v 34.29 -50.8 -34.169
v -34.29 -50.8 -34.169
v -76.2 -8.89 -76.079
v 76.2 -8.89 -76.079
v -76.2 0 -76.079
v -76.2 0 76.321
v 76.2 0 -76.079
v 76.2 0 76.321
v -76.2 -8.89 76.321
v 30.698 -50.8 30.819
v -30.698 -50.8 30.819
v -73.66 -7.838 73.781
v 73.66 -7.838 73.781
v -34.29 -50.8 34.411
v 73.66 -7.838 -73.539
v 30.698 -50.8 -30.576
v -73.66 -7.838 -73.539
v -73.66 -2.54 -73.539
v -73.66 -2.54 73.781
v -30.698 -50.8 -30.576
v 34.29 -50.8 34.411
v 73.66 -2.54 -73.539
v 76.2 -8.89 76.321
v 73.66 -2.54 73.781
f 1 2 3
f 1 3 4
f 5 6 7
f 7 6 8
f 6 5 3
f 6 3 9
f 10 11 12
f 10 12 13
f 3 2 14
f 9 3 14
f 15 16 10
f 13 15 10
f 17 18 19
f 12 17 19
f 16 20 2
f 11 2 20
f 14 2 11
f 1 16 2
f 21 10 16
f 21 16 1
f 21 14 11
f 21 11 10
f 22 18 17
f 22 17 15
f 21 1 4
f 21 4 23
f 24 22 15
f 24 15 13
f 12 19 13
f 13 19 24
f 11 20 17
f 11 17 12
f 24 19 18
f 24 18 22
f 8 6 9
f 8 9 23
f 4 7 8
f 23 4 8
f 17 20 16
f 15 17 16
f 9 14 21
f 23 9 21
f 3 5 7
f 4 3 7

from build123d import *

# Parameters (mm, degrees)
F0_W     = 152.4
F0_H     = 152.4
F1_DEPTH = 50.8
F2_SIZE  = 41.91
F3_T     = -2.54


with BuildPart() as f1:
    # F0 (on Front) → F1 (new body)
    with BuildSketch(Plane.XZ):
        with Locations((-7.7e-05, 0.121411)):
            Rectangle(F0_W, F0_H)
    extrude(amount=F1_DEPTH)

    # F2
    f2_edges = [f1.edges().sort_by_distance(p)[0] for p in [
        (-7.7e-05, -50.8, 76.321411),
        (-76.200077, -50.8, 0.121411),
        (-7.7e-05, -50.8, -76.078589),
        (76.199923, -50.8, 0.121411),
    ]]
    chamfer(f2_edges, length=F2_SIZE)

    # F3
    f3_openings = [f1.faces().sort_by_distance(p)[0] for p in [
        (-7.7e-05, -50.8, 0.121411),
    ]]
    offset(amount=F3_T, openings=f3_openings)


solid = f1.part
